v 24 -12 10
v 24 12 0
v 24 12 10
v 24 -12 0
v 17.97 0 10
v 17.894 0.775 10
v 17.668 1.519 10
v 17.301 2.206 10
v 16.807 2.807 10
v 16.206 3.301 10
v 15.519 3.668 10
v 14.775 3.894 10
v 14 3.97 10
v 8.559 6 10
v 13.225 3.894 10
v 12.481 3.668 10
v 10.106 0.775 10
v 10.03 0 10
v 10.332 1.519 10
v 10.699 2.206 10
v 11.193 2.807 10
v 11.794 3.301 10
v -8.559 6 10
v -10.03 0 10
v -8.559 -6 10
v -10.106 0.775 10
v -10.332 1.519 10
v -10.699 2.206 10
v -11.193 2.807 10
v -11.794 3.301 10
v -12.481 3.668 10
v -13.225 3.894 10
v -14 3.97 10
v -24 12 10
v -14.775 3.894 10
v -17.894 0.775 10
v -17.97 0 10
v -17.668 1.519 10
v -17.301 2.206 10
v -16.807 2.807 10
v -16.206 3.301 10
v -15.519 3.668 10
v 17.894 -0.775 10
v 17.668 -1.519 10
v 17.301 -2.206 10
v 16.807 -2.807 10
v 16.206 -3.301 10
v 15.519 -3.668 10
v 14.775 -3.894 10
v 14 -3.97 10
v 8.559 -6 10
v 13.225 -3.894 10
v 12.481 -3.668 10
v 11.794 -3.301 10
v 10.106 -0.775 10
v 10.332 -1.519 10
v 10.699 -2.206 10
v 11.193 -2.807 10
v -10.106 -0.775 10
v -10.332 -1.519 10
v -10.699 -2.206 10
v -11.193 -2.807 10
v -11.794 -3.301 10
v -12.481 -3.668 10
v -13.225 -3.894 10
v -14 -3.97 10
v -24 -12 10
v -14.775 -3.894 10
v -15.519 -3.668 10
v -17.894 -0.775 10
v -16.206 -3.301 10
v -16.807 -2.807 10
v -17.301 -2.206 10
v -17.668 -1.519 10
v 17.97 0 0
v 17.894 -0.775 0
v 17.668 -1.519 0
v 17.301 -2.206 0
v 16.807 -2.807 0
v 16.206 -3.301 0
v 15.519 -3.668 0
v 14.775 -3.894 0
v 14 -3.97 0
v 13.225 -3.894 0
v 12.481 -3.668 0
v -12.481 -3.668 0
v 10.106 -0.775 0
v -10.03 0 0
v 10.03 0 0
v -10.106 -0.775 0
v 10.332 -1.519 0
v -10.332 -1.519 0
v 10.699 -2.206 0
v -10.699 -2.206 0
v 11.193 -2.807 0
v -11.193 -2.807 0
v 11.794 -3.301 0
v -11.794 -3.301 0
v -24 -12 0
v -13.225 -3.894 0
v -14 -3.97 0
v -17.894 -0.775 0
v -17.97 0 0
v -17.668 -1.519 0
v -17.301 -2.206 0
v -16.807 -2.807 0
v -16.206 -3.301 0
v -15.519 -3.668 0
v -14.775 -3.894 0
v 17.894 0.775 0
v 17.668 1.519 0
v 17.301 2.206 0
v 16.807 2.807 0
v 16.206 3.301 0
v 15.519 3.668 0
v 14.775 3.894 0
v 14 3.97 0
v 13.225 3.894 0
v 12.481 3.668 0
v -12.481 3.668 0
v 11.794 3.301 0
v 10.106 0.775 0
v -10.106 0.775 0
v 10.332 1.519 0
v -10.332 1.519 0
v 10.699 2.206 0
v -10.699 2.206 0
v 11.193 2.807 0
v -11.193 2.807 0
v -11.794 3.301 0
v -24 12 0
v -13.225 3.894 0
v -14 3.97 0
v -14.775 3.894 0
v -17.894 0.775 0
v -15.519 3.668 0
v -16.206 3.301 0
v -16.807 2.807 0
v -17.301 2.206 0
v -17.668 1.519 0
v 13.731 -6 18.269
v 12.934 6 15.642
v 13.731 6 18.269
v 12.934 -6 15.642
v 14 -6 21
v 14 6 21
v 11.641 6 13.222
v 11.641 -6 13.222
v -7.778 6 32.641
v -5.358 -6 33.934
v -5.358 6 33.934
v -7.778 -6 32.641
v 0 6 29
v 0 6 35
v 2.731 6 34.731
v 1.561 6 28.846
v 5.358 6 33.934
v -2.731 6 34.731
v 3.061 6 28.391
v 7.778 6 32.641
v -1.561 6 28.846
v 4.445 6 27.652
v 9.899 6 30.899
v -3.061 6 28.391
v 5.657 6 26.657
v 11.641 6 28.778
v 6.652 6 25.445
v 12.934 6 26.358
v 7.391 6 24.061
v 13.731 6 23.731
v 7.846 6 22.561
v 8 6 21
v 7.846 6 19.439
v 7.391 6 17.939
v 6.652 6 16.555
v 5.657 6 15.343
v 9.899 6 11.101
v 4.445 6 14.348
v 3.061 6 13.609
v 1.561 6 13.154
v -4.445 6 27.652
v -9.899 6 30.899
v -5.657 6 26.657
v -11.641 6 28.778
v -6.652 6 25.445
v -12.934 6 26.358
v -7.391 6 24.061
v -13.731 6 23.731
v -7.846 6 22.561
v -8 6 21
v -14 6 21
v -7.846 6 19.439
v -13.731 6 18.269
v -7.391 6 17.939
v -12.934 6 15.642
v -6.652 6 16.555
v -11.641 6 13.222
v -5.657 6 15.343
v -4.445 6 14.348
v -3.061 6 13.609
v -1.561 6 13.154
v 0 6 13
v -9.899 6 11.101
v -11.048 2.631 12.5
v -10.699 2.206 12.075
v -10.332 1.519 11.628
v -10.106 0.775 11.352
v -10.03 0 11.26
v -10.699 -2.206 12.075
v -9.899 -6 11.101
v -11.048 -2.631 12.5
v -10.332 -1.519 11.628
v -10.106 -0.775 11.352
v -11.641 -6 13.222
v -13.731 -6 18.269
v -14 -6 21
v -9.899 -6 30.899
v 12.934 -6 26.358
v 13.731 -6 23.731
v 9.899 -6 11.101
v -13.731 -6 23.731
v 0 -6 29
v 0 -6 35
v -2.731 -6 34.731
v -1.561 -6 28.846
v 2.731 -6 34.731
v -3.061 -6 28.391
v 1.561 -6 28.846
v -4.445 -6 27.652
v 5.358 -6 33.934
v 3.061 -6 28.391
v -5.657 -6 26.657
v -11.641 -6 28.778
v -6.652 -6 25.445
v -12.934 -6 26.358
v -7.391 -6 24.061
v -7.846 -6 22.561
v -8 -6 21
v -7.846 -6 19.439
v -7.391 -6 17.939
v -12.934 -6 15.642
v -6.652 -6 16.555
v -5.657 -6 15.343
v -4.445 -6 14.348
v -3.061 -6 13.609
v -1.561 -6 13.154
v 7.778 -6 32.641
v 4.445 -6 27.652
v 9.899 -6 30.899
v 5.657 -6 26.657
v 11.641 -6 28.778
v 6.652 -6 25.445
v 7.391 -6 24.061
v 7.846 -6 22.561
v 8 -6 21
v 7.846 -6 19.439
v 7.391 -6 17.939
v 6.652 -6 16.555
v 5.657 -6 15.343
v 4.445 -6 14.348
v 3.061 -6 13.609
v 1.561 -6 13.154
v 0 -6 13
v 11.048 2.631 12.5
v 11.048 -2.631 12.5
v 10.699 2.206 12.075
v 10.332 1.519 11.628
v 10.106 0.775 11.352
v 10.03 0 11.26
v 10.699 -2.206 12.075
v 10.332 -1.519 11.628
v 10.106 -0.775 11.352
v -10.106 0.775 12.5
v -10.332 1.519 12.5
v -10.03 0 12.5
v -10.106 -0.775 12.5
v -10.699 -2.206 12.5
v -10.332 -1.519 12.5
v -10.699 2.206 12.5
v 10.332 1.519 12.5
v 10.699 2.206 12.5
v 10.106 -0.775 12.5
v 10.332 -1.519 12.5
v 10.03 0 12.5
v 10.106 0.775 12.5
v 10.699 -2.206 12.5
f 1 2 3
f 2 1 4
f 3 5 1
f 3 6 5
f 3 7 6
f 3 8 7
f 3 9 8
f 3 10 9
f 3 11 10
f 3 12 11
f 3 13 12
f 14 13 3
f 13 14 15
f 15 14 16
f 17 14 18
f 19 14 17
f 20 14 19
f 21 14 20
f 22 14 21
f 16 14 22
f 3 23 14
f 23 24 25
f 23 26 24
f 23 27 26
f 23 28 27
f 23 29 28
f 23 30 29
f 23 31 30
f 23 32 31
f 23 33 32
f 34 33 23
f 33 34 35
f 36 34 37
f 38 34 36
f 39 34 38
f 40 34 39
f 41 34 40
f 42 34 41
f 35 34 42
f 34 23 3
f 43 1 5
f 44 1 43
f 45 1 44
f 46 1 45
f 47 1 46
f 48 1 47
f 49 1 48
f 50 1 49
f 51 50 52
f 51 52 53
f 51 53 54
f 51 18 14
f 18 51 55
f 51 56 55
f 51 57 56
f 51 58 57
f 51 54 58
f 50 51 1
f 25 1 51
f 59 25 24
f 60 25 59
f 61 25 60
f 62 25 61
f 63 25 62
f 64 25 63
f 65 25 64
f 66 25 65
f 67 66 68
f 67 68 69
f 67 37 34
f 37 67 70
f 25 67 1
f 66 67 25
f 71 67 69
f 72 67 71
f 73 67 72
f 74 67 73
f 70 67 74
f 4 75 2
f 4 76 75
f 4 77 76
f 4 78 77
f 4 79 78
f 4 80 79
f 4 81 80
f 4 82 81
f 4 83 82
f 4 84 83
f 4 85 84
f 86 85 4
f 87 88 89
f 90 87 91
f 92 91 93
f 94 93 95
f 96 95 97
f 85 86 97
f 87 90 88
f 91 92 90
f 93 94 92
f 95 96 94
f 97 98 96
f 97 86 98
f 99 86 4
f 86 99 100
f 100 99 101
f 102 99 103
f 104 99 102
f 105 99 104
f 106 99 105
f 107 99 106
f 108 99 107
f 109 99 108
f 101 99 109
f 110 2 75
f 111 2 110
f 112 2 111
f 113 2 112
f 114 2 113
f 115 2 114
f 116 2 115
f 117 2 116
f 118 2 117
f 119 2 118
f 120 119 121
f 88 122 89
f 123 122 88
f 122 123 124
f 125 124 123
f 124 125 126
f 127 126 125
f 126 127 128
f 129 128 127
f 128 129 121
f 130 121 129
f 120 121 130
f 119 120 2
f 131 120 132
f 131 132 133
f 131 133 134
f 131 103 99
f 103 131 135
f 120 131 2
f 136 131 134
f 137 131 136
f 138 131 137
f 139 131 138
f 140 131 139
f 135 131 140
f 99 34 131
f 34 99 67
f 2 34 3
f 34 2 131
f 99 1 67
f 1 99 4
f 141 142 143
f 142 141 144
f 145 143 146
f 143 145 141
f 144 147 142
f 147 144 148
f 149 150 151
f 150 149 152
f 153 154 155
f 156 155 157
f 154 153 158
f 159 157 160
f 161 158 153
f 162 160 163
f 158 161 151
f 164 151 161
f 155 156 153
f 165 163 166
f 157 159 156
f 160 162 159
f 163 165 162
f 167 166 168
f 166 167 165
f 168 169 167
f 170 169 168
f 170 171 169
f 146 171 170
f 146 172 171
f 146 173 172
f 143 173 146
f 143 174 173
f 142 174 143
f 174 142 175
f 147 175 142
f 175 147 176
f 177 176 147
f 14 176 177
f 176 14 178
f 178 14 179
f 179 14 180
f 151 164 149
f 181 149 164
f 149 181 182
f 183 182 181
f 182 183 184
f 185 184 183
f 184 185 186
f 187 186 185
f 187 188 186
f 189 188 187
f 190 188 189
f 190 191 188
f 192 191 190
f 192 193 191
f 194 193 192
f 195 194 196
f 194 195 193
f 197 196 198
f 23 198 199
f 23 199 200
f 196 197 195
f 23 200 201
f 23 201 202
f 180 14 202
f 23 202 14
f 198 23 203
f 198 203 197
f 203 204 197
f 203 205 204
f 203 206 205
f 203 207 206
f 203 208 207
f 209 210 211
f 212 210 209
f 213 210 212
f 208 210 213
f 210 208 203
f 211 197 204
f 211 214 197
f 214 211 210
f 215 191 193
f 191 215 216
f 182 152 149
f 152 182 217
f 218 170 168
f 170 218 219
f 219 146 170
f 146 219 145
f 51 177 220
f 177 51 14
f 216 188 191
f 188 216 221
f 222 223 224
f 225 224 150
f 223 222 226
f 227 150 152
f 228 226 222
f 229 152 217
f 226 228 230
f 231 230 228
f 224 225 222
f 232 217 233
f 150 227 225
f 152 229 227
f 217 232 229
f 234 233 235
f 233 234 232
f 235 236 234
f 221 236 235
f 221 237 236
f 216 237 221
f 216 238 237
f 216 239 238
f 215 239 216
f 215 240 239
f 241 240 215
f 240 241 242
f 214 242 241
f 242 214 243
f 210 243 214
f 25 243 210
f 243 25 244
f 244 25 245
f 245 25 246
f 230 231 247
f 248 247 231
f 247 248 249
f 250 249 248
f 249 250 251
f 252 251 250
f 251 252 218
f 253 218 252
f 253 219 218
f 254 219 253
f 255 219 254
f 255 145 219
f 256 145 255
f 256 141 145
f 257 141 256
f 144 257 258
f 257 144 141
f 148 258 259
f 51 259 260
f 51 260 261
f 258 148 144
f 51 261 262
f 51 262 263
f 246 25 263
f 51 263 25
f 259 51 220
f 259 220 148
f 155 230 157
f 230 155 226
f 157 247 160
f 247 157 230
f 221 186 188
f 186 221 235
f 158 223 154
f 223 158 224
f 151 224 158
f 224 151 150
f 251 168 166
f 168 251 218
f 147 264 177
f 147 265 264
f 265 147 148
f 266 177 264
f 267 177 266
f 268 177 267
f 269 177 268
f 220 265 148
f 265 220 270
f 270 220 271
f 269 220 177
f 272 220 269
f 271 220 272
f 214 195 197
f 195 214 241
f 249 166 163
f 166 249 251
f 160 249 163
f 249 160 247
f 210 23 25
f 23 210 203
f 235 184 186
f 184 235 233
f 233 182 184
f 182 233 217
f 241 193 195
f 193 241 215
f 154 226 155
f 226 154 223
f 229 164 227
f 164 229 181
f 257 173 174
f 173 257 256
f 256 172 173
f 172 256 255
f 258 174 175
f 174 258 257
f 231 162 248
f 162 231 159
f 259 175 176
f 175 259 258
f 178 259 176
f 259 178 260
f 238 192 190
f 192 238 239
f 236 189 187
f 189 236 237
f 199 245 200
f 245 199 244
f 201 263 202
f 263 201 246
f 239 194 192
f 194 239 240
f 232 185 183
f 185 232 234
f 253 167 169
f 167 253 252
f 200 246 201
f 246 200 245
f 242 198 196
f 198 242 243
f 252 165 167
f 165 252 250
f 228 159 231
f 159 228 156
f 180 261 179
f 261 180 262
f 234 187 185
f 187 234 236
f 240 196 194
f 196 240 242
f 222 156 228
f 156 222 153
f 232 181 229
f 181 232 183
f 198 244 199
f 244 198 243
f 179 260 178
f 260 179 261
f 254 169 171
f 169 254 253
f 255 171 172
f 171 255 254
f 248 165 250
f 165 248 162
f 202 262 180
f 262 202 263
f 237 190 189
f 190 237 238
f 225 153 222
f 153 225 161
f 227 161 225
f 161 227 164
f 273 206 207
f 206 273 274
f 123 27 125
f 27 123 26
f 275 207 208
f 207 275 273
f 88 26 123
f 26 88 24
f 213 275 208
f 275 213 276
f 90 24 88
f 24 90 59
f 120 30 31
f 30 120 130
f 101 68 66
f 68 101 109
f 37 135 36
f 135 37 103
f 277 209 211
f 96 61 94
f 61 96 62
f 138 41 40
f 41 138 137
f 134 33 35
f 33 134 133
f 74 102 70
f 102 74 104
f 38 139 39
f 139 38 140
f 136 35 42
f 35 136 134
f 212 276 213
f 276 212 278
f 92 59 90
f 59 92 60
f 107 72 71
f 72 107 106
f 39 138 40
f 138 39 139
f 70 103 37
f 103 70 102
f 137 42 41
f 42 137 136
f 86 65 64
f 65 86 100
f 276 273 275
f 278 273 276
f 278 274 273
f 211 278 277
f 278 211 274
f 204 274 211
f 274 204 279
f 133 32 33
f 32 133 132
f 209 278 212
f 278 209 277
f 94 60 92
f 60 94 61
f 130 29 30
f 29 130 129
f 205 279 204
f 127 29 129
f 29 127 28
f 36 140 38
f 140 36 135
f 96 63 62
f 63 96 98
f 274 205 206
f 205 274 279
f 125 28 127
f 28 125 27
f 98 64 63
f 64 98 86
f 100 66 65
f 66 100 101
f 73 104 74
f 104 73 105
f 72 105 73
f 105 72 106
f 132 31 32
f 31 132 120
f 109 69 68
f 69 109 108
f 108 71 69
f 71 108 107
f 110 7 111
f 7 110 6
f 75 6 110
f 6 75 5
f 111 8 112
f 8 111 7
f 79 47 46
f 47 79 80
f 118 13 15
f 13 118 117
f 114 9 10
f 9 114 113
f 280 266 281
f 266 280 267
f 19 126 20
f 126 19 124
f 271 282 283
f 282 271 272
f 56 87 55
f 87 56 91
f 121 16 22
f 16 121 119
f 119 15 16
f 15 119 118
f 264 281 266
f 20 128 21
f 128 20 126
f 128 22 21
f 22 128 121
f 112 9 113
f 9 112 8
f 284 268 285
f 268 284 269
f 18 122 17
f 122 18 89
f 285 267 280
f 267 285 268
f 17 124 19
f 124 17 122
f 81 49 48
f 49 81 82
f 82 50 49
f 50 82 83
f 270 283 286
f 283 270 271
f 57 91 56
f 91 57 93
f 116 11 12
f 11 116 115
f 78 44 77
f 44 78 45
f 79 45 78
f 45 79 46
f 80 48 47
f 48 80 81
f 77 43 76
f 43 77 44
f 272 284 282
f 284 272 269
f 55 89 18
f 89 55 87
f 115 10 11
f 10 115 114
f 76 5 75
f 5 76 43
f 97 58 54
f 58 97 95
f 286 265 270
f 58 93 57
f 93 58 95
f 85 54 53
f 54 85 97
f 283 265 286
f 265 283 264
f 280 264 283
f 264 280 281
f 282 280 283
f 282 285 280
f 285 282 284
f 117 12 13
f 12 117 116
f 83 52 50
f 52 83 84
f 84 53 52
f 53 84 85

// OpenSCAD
$fn = 32;

// ----------------------------------------------------------------------
// Deck eye: 28 mm eye on a 48 mm base
// ----------------------------------------------------------------------

// --- parameters (mm) ---
base_l = 48;              // base length
base_w = 24;              // base width
base_t = 10;              // base thickness
eye_r = 14;               // eye outside radius
eye_bore = 16;            // eye bore diameter
eye_w = 12;               // eye thickness
eye_z = 21;               // eye centre height
holes_d = 7.94;           // fixing holes
hole_x = 14;              // fixing hole spacing

difference() {
  union() {
    translate([-24, -12, 0]) cube([base_l, base_w, base_t]);
    /* eye standing upright, its foot sunk 3 mm into the base */
    translate([0, -6, 21]) rotate([-90, 0, 0]) cylinder(h = 12, d = 28);
  }
  /* eye bore, 2.5 mm clear of both faces */
  translate([0, -8.5, 21]) rotate([-90, 0, 0]) cylinder(h = 17, d = 16);
  translate([-14, 0, -2.5]) cylinder(h = base_t + 5, d = holes_d);
  translate([14, 0, -2.5]) cylinder(h = base_t + 5, d = holes_d);
}
